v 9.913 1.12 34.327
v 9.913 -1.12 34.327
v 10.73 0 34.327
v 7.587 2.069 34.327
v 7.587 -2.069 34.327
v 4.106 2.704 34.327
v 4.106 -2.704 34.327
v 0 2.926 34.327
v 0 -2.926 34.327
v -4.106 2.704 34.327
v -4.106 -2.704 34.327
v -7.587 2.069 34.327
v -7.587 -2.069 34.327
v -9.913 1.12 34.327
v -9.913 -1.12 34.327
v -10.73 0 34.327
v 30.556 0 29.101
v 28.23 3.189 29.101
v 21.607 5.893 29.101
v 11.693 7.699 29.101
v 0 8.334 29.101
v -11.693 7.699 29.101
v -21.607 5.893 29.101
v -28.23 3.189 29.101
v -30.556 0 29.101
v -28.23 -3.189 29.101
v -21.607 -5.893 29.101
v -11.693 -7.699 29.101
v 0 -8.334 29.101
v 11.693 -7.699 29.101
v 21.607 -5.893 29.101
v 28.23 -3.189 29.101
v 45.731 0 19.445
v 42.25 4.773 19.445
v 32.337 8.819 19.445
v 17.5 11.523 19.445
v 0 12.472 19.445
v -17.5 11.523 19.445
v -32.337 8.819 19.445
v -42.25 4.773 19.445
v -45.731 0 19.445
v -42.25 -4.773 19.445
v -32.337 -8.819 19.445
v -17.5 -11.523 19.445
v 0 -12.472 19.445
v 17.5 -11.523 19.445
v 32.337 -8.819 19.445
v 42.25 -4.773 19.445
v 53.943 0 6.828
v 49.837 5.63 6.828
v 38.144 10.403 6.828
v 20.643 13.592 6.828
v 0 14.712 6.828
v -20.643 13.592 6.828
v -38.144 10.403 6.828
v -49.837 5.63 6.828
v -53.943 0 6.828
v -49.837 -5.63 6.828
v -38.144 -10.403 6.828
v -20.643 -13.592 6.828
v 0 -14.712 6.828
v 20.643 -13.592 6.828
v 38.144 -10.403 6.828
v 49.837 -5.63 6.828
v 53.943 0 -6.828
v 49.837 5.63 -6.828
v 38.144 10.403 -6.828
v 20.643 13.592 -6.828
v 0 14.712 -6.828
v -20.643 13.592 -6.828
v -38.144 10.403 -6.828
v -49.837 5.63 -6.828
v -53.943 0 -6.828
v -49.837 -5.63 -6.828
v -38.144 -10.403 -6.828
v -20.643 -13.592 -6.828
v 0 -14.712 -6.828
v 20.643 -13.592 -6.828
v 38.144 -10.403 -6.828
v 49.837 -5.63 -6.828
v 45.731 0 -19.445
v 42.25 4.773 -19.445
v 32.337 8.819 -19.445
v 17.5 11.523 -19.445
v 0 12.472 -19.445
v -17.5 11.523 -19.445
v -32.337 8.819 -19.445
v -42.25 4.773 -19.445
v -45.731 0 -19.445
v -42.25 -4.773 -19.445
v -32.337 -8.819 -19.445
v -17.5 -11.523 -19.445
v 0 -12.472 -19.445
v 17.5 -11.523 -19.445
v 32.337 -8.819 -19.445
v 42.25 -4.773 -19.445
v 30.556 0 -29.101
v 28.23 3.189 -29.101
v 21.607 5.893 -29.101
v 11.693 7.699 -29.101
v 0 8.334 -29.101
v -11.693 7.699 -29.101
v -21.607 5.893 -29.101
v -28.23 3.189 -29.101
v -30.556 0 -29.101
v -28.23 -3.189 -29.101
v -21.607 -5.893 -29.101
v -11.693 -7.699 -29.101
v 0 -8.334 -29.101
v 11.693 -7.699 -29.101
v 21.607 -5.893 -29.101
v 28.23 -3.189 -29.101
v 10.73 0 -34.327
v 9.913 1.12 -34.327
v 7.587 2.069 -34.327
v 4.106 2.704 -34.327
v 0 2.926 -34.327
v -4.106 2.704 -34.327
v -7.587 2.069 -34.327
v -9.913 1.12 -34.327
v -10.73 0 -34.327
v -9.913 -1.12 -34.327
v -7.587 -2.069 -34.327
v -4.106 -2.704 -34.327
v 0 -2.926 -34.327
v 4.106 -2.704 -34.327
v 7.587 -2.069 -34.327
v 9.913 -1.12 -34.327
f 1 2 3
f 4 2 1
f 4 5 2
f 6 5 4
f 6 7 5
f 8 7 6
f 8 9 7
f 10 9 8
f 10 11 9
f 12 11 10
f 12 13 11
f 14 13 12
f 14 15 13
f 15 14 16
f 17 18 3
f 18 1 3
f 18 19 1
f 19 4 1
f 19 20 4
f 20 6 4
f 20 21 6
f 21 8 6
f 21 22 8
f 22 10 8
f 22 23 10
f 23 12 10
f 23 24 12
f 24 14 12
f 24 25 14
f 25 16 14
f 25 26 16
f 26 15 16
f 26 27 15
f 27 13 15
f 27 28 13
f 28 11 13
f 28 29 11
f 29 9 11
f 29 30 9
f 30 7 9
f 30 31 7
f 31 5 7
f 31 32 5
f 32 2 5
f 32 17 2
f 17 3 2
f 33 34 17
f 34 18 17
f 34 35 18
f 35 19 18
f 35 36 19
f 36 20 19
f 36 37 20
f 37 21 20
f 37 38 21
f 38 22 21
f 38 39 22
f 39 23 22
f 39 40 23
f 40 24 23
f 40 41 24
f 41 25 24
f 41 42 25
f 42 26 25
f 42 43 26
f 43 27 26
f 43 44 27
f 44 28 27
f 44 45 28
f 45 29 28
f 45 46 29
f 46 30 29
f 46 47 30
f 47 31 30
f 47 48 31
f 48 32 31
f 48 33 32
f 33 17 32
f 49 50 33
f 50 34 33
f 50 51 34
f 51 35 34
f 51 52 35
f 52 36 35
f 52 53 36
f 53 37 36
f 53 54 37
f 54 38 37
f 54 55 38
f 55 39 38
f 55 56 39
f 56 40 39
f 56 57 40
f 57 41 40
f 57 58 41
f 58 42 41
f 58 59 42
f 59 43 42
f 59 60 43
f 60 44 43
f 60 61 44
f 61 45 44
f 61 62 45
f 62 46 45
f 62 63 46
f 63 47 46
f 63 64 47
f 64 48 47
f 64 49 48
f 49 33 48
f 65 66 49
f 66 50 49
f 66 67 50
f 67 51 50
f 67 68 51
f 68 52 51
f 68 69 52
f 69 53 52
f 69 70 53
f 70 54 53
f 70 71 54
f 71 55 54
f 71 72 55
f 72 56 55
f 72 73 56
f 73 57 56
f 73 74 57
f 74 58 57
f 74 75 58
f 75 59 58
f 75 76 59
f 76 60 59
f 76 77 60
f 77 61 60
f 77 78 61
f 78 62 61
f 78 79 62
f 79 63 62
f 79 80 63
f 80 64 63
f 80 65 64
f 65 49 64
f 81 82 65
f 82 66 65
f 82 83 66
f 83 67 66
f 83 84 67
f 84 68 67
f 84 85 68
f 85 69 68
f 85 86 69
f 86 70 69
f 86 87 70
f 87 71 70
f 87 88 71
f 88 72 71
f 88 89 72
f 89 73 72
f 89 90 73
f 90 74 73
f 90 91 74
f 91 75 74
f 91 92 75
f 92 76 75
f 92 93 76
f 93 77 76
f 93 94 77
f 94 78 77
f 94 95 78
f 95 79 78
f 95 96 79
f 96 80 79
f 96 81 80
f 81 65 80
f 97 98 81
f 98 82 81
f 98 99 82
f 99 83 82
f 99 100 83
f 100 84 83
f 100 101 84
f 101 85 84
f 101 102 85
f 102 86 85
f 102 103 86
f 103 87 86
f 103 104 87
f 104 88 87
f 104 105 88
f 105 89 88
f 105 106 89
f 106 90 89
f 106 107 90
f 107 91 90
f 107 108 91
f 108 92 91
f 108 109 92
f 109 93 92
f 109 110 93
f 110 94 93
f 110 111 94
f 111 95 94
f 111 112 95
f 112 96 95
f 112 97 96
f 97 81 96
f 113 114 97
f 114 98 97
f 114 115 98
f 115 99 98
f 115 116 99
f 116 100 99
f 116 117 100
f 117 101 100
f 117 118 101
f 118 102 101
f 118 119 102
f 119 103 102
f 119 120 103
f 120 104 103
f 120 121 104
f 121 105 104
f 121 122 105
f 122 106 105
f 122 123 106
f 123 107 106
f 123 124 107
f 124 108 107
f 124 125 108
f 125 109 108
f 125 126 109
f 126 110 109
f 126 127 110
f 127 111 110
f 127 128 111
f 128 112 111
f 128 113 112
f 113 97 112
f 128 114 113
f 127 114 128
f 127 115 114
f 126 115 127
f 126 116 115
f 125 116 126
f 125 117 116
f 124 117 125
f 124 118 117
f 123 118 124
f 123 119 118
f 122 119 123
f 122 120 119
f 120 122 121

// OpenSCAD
// Generated by SolidPython 1.0.1 on 2020-07-29 00:46:49


scale(v = [11, 3, 7]) {
	sphere(r = 5);
}
/***********************************************
*********      SolidPython code:      **********
************************************************
 
# import packages: SolidPython
from solid import *
from solid.utils import *
from itertools import chain, combinations, permutations


class Resize:

    def __init__(self, scad_file):
        self.scad_file = scad_file
        #self.scad_file = import_scad(scad_file)
        # cone/cylinder param:
        self.r1 = 0
        self.r2 = 0
        self.h = 0
        # rectangular prism param:
        self.w = 0
        self.l = 0
        # ellipse param:
        self.r = 0

    # import OpenScad code (file name corresponds to shape)


    # classify shape + parameters
    def assign(self, param1, param2, param3):
        if self.scad_file == 'cone.scad':
            self.r1 = param1
            self.r2 = param2
            self.h = param3
        elif self.scad_file == 'cylinder.scad':
            self.r1 = param1
            self.r2 = param2
            self.h = param3
        elif self.scad_file == 'rectangularPrism.scad':
            self.h = param1
            self.l = param2
            self.w = param3
        else:
            self.r = param1
            self.h = param2

    # resize parameters
    def iterate(self):
        x = range(3, 20, 2)
        i = 1
        if self.scad_file == 'cone.scad':
            tempList = list(permutations(x, 2))
            for temp in tempList:
                param1 = temp[0]
                param2 = temp[1]
                filepath = 'produced_scad_files/' + 'cone' + str(param1) + '_' + str(param2) + '_' + '.scad'
                scad_render_to_file(cylinder(h=param1, r1=param2, r2=0), filepath)

        elif self.scad_file == 'cylinder.scad':
            tempList = list(permutations(x, 3))
            for temp in tempList:
                param1 = temp[0]
                param2 = temp[1]
                filepath = 'produced_scad_files/' + 'cylinder' + str(param1) + '_' + str(param2) + '_' + '.scad'
                scad_render_to_file(cylinder(h=param1, r1=param2, r2=param2), filepath)

        elif self.scad_file == 'rectangularPrism.scad':
            tempList = list(permutations(x, 3))
            for temp in tempList:
                param1 = temp[0]
                param2 = temp[1]
                param3 = temp[2]
                filepath = 'produced_scad_files/' + 'rectangularPrism' + str(param1) + '_' + str(param2) + '_' + str(
                    param3) + '.scad'
                scad_render_to_file(cube(size=(param1, param2, param3)), filepath)

        elif self.scad_file == 'ellipse.scad':
            tempList = list(permutations(x, 4))
            for temp in tempList:
                param1 = temp[0]
                param2 = temp[1]
                param3 = temp[2]
                param4 = temp[3]
                filepath = 'produced_scad_files/' + 'ellipse' + str(param1) + '_' + str(param2) + '_' + str(param3) + '_' + str(param4) + '.scad'
                scad_render_to_file(scale([param1, param2, param3])(sphere(r=param4)), filepath)

    def render_to_scadfile(self):
        scad_render_to_file(scad, 'example.scad') 
 
************************************************/
